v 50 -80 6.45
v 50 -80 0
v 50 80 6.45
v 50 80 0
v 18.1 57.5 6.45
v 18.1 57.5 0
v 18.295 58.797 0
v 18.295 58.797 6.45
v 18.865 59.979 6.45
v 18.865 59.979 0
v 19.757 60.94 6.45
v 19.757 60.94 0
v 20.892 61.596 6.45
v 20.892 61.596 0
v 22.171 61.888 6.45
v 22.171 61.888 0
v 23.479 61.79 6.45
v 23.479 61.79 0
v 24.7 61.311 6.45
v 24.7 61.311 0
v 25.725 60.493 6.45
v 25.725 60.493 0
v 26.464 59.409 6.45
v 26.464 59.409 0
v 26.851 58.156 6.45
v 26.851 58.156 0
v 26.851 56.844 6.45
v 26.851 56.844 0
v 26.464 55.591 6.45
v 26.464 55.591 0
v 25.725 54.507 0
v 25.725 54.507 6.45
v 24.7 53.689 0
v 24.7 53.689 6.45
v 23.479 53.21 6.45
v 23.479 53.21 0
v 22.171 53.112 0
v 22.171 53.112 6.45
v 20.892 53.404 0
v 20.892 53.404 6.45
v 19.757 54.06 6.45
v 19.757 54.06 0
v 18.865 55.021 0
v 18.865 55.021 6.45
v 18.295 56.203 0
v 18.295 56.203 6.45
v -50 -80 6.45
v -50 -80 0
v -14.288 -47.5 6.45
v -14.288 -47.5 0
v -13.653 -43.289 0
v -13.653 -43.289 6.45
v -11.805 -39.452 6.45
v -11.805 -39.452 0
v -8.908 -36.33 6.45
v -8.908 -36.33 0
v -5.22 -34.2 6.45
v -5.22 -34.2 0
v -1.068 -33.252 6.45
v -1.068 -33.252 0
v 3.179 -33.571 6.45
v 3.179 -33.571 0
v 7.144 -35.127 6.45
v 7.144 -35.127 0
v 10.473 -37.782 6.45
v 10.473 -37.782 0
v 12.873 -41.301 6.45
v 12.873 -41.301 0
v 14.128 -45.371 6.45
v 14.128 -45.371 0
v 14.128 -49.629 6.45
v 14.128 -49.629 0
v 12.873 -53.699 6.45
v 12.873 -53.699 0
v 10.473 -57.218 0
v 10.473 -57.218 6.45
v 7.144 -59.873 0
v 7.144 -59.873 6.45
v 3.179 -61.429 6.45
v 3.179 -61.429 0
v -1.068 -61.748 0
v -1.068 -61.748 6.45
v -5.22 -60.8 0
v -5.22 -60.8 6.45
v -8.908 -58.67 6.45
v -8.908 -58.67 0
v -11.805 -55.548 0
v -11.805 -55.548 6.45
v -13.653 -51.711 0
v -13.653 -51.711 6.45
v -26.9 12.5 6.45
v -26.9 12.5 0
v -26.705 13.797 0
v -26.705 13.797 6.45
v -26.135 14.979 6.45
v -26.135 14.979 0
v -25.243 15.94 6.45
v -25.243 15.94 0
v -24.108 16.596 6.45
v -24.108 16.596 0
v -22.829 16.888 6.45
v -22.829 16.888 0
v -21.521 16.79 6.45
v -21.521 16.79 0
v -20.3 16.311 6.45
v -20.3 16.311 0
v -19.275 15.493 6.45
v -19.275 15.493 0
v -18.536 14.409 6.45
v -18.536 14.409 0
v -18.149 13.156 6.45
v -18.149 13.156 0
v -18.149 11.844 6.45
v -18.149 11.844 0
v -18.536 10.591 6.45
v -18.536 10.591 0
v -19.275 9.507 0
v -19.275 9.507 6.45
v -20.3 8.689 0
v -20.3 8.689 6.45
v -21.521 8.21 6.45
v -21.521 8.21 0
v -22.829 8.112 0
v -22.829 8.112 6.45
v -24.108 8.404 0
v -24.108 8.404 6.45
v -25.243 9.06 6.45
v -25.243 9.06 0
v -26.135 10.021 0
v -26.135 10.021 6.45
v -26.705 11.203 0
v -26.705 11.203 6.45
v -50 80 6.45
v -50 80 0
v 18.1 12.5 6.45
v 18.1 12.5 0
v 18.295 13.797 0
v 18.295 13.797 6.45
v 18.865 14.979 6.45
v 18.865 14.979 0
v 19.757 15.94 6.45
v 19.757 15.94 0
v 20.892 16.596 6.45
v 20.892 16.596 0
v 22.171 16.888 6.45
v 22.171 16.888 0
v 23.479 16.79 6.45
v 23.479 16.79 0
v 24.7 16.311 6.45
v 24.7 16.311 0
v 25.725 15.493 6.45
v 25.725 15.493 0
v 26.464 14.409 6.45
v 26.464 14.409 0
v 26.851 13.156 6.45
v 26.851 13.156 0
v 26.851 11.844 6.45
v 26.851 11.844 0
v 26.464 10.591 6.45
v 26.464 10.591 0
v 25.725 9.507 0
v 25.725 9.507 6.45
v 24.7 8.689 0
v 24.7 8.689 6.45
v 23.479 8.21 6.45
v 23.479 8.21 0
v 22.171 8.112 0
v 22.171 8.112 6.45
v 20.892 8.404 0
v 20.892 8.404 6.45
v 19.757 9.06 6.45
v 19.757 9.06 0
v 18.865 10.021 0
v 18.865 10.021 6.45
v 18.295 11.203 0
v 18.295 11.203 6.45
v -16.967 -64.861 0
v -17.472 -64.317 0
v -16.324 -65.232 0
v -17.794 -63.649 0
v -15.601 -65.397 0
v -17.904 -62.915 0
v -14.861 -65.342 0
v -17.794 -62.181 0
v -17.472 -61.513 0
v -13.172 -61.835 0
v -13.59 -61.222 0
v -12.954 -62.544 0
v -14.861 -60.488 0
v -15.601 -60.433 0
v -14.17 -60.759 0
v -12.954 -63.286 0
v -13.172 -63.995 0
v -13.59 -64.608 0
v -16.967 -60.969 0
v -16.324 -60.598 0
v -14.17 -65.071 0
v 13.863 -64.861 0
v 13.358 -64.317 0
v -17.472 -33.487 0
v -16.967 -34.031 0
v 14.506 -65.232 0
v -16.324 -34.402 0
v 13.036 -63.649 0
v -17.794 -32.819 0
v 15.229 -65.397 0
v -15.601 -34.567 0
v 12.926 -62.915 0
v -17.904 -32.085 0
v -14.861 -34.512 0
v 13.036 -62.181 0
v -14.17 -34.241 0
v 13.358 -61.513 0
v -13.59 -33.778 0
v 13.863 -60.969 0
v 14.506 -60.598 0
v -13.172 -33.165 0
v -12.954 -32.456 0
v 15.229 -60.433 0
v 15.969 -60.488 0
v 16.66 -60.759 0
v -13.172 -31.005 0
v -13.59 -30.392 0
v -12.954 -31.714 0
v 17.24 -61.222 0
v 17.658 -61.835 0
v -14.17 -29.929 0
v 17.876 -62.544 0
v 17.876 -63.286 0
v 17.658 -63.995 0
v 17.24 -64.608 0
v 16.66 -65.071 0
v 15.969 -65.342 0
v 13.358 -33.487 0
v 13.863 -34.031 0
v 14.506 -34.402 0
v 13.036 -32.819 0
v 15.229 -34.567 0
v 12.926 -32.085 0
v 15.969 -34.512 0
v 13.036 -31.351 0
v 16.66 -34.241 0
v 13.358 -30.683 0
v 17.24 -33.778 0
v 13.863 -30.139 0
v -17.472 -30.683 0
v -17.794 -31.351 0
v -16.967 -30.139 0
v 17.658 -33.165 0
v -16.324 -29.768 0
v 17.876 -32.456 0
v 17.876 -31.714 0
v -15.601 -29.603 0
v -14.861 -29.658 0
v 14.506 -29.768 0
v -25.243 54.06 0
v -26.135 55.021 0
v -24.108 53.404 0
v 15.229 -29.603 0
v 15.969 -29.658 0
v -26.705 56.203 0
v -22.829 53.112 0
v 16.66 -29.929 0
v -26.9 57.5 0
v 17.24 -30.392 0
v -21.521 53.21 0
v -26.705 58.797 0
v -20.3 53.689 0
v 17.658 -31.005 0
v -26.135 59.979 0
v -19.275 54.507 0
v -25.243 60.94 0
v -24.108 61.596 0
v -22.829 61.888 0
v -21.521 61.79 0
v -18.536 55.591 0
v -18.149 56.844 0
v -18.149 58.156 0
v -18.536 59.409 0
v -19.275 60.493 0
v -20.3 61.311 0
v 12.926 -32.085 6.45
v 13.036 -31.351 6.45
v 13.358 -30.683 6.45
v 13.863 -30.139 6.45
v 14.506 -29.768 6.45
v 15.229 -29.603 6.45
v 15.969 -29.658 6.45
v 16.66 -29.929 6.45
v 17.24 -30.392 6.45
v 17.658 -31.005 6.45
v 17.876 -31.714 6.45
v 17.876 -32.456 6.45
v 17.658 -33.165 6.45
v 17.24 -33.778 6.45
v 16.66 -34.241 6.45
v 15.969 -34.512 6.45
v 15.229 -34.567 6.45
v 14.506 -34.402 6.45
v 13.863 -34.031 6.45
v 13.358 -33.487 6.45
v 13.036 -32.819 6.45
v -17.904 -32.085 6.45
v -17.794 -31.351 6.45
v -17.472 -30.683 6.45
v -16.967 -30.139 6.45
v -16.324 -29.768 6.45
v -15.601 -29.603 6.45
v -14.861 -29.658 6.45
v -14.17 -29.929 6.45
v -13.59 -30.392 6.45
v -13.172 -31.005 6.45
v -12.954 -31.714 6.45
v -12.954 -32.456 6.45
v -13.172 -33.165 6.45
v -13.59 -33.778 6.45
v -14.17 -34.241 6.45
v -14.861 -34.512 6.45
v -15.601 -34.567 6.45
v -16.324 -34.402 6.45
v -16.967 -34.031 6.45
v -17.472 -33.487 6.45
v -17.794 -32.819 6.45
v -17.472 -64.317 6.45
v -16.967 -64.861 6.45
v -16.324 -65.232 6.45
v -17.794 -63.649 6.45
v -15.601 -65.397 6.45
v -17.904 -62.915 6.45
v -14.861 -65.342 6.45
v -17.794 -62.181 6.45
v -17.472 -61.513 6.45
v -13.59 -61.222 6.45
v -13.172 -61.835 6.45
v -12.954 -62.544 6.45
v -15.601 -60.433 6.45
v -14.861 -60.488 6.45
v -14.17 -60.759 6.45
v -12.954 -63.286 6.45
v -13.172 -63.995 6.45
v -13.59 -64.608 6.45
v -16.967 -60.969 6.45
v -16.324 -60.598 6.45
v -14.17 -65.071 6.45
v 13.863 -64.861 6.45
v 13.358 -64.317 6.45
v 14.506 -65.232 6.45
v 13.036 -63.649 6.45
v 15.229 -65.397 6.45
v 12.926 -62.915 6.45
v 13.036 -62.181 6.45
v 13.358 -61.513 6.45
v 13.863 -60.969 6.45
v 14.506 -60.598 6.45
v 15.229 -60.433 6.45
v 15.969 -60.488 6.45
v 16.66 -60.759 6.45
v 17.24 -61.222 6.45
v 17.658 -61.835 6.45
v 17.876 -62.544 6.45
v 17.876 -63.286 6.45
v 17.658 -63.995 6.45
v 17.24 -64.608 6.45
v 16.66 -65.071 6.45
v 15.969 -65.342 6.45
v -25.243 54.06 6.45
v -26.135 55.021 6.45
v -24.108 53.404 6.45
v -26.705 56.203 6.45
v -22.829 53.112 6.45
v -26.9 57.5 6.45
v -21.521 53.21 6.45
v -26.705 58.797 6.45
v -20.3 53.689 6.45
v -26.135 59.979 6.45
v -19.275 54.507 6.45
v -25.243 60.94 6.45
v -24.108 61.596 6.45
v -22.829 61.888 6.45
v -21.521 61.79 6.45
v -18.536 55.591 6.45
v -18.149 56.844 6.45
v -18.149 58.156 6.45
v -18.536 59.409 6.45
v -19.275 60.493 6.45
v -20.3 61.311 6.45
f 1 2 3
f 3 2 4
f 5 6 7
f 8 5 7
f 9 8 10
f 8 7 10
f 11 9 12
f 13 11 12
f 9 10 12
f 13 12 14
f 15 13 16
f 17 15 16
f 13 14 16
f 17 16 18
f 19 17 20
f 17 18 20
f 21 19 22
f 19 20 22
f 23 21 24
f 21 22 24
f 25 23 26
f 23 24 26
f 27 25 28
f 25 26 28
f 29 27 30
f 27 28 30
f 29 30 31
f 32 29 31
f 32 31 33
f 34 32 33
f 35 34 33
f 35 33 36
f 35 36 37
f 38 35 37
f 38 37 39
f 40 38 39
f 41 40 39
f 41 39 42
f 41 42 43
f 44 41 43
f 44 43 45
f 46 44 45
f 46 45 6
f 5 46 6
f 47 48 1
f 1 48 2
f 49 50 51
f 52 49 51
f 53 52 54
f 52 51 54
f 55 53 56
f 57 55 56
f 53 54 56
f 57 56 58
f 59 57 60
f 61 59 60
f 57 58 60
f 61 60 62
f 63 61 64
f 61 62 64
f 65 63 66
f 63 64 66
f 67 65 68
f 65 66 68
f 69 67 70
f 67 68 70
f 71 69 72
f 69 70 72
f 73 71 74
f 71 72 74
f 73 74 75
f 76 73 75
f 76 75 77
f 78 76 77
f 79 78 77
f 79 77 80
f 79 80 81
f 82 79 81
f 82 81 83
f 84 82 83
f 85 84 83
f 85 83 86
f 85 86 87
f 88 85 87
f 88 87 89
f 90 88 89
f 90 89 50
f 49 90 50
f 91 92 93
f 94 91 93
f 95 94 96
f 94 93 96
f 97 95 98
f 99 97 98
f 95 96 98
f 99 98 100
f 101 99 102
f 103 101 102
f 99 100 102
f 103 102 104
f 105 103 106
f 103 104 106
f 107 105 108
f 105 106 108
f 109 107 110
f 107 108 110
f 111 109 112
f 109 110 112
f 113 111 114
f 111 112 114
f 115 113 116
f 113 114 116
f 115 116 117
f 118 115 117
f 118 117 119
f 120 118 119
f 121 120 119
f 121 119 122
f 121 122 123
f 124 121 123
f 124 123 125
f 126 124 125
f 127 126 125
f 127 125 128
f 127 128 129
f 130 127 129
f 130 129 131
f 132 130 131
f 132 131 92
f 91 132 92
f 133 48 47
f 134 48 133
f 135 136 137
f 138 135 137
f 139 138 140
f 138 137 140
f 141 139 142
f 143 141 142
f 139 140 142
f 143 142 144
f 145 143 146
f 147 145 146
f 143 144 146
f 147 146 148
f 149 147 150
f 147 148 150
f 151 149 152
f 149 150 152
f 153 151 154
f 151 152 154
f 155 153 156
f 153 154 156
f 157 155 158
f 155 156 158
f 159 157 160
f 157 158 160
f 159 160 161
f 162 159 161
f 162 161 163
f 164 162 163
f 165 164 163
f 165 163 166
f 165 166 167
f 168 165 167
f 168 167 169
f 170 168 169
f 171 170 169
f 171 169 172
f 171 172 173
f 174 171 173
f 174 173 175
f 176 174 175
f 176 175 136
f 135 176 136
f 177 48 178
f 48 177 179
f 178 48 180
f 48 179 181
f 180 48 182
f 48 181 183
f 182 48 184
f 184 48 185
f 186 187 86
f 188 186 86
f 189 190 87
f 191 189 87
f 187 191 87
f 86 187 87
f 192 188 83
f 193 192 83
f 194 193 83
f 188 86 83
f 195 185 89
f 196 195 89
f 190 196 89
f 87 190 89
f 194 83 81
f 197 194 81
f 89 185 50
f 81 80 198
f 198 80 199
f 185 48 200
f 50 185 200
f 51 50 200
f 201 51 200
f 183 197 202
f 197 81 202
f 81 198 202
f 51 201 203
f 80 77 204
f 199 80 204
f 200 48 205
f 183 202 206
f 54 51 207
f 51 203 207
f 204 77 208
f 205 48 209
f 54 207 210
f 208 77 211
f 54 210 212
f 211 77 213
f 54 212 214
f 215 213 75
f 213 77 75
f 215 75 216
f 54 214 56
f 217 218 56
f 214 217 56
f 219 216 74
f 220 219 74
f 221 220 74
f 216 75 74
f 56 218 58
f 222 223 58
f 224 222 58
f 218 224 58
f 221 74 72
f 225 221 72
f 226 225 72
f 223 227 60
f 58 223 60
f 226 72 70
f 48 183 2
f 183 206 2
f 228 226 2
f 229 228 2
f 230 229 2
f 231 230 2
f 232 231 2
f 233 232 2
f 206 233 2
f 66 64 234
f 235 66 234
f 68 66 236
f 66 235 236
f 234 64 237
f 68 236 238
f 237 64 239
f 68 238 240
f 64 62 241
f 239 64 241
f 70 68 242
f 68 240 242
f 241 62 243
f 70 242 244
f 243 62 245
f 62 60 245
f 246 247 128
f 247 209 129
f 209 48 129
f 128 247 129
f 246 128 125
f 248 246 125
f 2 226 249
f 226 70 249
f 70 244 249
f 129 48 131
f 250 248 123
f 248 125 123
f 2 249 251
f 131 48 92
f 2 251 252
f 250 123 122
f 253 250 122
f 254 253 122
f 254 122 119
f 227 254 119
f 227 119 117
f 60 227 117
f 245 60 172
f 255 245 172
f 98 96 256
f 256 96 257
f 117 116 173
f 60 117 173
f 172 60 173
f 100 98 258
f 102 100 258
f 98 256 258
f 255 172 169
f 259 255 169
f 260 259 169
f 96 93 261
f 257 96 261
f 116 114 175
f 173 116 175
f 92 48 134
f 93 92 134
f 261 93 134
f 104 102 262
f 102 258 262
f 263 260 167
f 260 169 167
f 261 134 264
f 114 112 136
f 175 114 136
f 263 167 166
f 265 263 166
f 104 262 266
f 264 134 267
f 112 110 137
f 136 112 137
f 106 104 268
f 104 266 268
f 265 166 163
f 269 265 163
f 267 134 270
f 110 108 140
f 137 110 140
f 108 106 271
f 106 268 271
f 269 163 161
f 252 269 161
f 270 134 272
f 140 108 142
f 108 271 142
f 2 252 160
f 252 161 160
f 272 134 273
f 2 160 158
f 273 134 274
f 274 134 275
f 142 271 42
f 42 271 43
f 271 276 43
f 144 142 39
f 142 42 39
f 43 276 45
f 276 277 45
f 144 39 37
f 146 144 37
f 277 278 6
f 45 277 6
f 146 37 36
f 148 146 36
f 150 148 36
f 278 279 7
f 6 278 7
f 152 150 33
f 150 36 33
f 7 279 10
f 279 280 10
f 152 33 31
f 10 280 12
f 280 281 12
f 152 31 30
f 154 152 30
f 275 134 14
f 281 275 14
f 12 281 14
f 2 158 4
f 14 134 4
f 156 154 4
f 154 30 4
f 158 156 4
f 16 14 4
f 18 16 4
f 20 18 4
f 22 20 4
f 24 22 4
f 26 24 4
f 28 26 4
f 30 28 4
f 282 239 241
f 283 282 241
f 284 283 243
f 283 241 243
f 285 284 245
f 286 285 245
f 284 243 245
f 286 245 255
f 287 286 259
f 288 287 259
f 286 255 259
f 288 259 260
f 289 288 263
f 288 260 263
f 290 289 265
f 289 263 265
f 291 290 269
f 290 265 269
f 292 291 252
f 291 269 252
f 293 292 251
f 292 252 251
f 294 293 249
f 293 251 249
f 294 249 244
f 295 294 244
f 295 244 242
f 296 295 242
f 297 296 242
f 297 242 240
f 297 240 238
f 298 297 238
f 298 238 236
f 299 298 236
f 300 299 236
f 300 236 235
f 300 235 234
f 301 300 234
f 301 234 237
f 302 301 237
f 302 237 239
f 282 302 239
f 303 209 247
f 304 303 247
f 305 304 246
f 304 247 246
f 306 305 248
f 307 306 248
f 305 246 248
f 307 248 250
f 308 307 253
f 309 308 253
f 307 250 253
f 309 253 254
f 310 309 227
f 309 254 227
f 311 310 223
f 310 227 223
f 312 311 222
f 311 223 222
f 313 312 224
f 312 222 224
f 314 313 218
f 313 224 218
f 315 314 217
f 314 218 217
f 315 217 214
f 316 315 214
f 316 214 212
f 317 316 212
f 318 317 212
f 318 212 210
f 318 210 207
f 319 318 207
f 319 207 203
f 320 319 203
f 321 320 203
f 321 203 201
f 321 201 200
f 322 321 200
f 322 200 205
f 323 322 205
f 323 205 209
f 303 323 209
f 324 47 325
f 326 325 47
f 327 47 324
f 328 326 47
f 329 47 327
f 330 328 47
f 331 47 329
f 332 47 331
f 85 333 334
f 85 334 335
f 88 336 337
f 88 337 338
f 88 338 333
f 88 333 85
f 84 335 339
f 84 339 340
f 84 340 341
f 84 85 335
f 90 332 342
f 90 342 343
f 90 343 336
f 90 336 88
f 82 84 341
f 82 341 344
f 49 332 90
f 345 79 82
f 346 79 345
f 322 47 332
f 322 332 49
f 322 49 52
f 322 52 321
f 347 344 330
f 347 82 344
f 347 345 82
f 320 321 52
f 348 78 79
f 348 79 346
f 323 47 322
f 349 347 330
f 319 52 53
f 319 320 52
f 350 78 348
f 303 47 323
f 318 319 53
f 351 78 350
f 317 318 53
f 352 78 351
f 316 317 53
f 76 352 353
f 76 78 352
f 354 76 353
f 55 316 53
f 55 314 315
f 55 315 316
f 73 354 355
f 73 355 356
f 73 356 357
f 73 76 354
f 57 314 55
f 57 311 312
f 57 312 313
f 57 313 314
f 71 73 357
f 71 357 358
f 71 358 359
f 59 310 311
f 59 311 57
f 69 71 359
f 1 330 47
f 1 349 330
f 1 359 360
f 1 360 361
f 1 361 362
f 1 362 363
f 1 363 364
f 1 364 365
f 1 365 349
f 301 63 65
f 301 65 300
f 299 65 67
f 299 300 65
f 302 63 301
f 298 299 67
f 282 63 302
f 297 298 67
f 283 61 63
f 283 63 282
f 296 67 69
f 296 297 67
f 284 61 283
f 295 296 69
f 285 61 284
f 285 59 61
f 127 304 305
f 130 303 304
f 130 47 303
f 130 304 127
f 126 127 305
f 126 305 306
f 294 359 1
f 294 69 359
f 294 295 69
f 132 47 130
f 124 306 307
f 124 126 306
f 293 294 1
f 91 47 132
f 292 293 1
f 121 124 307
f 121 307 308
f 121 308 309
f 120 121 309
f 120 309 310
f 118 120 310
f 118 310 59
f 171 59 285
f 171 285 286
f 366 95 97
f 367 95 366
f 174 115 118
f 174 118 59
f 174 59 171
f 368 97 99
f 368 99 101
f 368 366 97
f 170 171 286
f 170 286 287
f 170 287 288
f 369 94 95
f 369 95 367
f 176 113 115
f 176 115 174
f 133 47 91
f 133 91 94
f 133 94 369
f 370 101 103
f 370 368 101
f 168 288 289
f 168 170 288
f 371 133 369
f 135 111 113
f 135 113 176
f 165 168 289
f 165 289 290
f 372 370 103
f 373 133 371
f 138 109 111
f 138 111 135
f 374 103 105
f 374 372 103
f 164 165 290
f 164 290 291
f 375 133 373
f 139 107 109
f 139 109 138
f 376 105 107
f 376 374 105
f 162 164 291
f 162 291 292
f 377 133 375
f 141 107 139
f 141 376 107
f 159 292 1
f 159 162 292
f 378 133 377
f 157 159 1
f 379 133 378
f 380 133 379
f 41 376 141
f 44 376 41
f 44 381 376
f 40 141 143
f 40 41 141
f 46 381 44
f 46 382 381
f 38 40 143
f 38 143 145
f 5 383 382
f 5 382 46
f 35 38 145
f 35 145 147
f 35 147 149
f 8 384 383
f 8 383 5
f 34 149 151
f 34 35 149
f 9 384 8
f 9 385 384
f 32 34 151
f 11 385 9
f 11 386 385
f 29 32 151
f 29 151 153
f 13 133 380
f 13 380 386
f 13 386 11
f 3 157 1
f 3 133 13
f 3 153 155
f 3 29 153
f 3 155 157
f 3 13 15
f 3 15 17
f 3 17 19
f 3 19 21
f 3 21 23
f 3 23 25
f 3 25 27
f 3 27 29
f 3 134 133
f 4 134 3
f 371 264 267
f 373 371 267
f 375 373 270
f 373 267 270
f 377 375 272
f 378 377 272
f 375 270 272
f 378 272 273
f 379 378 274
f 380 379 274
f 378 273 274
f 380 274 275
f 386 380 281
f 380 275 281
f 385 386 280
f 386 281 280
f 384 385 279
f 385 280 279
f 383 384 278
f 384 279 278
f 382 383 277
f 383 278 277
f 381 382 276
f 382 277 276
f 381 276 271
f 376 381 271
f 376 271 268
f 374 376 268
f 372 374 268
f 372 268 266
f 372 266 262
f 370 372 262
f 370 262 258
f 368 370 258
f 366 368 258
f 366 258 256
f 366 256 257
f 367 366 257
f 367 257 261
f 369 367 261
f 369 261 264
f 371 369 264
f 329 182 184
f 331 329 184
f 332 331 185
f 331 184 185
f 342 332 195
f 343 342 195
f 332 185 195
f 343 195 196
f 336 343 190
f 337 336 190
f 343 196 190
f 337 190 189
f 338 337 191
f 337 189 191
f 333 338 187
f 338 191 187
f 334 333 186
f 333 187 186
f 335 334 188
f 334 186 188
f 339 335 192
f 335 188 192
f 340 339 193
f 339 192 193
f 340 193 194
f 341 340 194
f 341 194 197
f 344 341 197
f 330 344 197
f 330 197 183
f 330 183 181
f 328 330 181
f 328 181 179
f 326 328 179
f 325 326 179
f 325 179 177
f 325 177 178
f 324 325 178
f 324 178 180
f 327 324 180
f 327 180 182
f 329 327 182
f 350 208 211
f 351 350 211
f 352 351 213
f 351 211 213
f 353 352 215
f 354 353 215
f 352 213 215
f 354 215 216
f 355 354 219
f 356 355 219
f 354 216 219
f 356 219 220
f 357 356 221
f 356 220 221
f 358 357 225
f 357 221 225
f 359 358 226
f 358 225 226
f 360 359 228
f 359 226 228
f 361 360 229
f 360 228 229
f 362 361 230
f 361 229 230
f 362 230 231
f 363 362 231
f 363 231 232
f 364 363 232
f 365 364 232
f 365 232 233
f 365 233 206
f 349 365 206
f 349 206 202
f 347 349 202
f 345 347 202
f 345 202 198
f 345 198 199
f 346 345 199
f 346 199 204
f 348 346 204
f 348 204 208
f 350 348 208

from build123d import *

# Parameters (mm, degrees)
F0_W     = 100
F0_H     = 160
F1_DEPTH = 6.45
F3_D     = 8.8
F5_D     = 4.9784
F7_D     = 28.575


with BuildPart() as f1:
    # F0 (on Top) → F1 (new body)
    with BuildSketch(Plane.XY):
        Rectangle(F0_W, F0_H)
    extrude(amount=F1_DEPTH)

    # F3 (through all)
    with Locations(Plane.XY.offset(6.45)):
        with Locations((-22.5, 57.5), (22.5, 57.5), (22.5, 12.5), (-22.5, 12.5)):
            Hole(F3_D / 2)

    # F5 (through all)
    with Locations(Plane.XY.offset(6.45)):
        with Locations((-15.4149278299, -32.0850721701), (15.4149278299, -32.0850721701), (15.4149278299, -62.9149278299), (-15.4149278299, -62.9149278299)):
            Hole(F5_D / 2)

    # F7 (through all)
    with Locations(Plane.XY.offset(6.45)):
        with Locations((0, -47.5)):
            Hole(F7_D / 2)


solid = f1.part
